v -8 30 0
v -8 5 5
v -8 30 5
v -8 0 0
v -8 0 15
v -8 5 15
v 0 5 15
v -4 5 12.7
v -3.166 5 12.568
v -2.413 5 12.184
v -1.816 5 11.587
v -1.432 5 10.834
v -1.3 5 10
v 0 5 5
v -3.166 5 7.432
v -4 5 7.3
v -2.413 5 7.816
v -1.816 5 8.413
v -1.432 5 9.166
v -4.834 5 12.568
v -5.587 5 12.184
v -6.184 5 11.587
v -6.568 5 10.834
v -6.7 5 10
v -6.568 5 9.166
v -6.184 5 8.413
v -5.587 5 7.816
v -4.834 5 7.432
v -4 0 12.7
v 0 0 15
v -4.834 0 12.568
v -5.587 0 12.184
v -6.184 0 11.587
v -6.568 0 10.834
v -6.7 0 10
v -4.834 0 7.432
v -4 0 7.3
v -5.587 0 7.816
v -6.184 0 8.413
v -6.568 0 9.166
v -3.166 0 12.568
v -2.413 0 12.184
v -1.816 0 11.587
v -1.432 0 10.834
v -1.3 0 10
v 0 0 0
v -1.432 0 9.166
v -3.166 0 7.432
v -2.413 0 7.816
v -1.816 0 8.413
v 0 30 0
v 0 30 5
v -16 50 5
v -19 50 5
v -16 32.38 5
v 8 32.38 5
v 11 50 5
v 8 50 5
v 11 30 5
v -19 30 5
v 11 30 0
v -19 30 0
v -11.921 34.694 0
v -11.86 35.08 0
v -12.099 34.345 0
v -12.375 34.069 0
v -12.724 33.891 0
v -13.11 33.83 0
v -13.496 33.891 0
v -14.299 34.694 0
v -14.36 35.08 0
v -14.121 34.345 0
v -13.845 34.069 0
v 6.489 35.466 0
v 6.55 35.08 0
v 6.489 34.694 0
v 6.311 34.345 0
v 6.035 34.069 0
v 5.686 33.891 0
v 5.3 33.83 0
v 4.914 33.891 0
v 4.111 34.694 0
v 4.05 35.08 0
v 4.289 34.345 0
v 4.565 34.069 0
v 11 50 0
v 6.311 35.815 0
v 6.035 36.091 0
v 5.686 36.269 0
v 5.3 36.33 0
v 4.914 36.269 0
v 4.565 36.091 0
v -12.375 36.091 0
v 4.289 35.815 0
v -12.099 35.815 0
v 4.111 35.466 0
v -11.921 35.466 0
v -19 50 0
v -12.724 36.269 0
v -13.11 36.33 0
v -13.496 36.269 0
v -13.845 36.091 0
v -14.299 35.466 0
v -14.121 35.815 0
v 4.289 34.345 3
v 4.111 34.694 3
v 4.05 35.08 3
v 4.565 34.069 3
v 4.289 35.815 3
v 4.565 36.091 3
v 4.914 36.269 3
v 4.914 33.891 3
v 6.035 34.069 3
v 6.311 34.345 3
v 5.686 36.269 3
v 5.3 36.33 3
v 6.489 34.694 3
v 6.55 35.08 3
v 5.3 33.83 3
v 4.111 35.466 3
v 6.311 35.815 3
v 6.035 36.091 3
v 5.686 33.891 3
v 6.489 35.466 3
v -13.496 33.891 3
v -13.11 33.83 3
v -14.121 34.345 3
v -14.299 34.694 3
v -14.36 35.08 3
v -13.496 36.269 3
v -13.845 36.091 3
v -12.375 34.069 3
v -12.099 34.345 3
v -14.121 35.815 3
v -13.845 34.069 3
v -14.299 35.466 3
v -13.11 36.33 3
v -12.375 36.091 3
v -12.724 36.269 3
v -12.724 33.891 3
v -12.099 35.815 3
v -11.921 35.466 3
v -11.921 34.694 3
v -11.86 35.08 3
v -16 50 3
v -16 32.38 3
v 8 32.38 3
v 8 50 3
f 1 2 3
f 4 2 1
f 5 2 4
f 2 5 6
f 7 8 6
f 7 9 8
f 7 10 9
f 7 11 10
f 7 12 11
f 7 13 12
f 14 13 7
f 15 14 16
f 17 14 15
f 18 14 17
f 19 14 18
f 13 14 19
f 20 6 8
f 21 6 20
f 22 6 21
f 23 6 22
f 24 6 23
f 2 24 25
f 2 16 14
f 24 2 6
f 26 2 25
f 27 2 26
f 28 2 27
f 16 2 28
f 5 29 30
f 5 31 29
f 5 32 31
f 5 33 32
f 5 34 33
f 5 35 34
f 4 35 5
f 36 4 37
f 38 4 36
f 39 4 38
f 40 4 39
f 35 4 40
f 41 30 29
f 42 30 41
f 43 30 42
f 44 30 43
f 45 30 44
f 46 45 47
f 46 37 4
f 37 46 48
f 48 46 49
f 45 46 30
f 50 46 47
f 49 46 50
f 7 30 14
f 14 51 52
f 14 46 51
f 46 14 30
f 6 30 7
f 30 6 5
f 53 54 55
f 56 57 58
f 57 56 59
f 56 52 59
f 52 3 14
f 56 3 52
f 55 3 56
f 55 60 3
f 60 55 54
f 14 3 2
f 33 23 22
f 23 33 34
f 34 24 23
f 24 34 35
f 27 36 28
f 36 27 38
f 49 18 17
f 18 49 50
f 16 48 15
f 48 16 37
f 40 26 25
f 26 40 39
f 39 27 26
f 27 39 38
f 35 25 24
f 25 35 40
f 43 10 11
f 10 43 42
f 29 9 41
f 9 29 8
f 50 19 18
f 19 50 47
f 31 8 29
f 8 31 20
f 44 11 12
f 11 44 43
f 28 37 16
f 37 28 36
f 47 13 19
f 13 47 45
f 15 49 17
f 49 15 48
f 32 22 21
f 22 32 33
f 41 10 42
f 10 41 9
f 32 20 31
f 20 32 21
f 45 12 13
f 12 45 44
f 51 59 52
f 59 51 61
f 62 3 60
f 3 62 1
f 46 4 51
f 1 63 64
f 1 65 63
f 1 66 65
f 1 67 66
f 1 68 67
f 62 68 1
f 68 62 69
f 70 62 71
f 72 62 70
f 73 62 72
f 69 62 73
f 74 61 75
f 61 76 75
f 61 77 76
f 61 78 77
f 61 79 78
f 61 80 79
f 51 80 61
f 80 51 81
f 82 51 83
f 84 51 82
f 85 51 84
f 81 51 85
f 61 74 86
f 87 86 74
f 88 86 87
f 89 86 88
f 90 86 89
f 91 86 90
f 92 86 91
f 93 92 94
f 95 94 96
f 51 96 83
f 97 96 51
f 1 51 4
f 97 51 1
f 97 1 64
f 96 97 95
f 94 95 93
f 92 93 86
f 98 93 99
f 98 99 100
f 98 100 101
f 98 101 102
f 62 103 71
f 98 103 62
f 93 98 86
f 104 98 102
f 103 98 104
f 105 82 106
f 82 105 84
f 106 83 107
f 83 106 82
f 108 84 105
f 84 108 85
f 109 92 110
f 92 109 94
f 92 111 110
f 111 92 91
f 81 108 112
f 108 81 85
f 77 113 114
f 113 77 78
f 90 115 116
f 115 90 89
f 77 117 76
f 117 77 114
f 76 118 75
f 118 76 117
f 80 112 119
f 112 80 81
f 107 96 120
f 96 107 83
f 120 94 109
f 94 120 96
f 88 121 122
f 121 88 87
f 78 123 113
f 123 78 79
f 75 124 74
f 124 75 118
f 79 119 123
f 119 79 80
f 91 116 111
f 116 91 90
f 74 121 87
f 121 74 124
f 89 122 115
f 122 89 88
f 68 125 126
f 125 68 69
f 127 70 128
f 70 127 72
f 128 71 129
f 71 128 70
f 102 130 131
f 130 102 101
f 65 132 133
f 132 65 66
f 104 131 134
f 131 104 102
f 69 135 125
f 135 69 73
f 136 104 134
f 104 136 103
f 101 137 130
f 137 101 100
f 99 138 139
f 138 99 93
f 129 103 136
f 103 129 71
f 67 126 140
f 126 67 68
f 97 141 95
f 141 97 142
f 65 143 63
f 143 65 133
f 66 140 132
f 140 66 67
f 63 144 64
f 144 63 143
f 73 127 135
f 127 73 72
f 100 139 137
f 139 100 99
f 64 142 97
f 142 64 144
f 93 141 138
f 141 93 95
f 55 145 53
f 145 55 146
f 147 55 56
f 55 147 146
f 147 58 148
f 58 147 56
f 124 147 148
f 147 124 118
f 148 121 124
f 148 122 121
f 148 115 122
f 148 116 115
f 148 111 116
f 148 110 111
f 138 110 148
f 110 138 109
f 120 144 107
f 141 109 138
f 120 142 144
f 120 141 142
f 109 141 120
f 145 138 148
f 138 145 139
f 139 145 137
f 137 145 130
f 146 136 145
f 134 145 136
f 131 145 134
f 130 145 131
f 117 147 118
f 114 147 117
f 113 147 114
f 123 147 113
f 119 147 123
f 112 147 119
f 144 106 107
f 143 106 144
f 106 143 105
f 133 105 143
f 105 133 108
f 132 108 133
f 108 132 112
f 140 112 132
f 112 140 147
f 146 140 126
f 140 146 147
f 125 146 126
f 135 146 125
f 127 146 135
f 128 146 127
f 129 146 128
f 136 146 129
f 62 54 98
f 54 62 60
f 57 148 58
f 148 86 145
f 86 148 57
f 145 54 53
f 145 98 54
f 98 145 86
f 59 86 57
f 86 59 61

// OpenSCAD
/* [Global Options] */

//There are two ways to mount this, adjustable and fixed. Adjustable can be used for prototyping how it needs to be, but fixed is the recommended option
type = "fixed"; //[fixed, adjustable]

//The total length of the print, usually the length of the hotend minus a small amount. Default value is good for J-Head MK IV-B with a groovemount on a Ultimate Greg's Wade's extruder ( http://www.thingiverse.com/thing:961630 )
hotend_length = 50;

//The resolution to use when rendering holes
resolution = 20;

//If the output should be rendered how it's supposed to be mounted or how it should be printed
render_type = "printed"; //[printed, mounted]

/* [Attachment] */

//The mounting hole to the extruder block, you shouldn't need to modify this
attachment_mount_hole = 5.4;
//The height of the screw mount to the extruder block
attachment_mount_height = 10;
//The thickness of the attachment point to both the extruder block and the sensor board
attachment_thickness = 5;
//The width of the entire attachment
attachment_width = 8;
//The offset from the edges of the internal slide hole. Unused for fixed
attachment_slide_offset = 10;
//The width of the internal slide hole, unused for fixed
attachment_hole_width = 3.2;

/* [Sensor Mount] */
//The mounting holes for the sensor board. Specification is M2.5 screws. Set to exact value so the screws can grip the plastic
sensor_hole = 2.5;
//The width of the sensor board. Taken from the spec sheet
sensor_width = 24;
//The height of the sensor board. Taken from the spec sheet
sensor_height = 17.62;
//The depth of the sensor board
sensor_depth = 2;
//The width of the entire mount
sensor_mount_width = 30;
//The height of the entire mount
sensor_mount_height = 20;

// The thickness of the sensor board mount. On fixed this is the same as the attachment thickness and thus this variable has no effect
sensor_mount_thickness = 8;

// Using the bottom-left of the sensor board, the x of the left hole. Gotten from the spec sheet
sensor_lefthole = 2.7;
// Using the bottom-left of the sensor board, the x of the right hold. Gotten from the spec sheet
sensor_righthole = 21.11;
//Using the bottom-left of the sensor board, the y of both holes. Gotten using the spec sheet
sensor_hole_y = 14.92;
//The width of the attachment point. Unused in fixed
sensor_mount_attach_width = 10;
//The height of the attachment point. Unused in fixed
sensor_mount_attach_height = 8;

/* [Hidden] */
//I use this section for mainly modifying variables used in customizer to variables I used while designing
preview_tab = "";
render_print = render_type == "printed";

//sensor_hole_locations = [[2.7, 14.92], [21.11, 14.92]];
sensor_hole_locations = [[sensor_lefthole, sensor_hole_y], [sensor_righthole, sensor_hole_y]];
sensor_mount_hole = attachment_hole_width;
sensor_mount_depth = sensor_mount_thickness;

$fn = resolution;

if(type == "adjustable"){
if(render_print){
	//Render it how it should be printed
	translate([5, 0, sensor_mount_depth])
	rotate([-90, 0, 0])
	highlight("Sensor Mount")
	sensor_mount();
	
	translate([-5, 0, 0])
	rotate([90, 0, 180])
	highlight("Attachment")
	attachment();
} else {
	//Render it how it should be mounted
	translate([-sensor_mount_width/2, -sensor_mount_depth, 0])
	highlight("Sensor Mount")
	sensor_mount();

	rotate([0, 180, 0])
	translate([-attachment_width/2, 2, -hotend_length-sensor_mount_attach_height/2-sensor_mount_height+sensor_mount_hole*2])
	highlight("Attachment")
	attachment();
}
} else if(type == "fixed"){
	sensor_mount_depth = attachment_thickness;
	if(render_print){
		v2();
	} else {
		translate([0, 0, hotend_length/2])
		rotate([-90, 0, 0])
		translate([attachment_width/2, -hotend_length/2, -attachment_thickness/2])
		v2();
	}
} else echo("Error, invalid type");

module v2(){
	rotate([90, 0, 180])
	highlight("Attachment")
	union(){
	translate([0, attachment_thickness, 0])
		difference(){
			cube([attachment_width, attachment_mount_height, attachment_thickness]); 
			translate([attachment_width/2, attachment_mount_height/2, attachment_thickness/2])
			cylinder(center=true, d=attachment_mount_hole, h=attachment_thickness*2);
	}
	cube([attachment_width, attachment_thickness, hotend_length-sensor_mount_height]);
}
	translate([(sensor_mount_width-attachment_width)/2, hotend_length, attachment_thickness])
	rotate([90, 180, 0])
	highlight("Sensor Mount")
	difference(){
		cube([sensor_mount_width, attachment_thickness, sensor_mount_height]);
		translate([(sensor_mount_width-sensor_width)/2, 0, 0]){
			translate([0, -sensor_depth, -sensor_height])
			cube([sensor_width, sensor_depth*2, sensor_height*2]);
			rotate([90, 0, 0]){
				translate([sensor_hole_locations[0][0], sensor_hole_locations[0][1], -attachment_thickness/2*3])
				cylinder(d=sensor_hole, h=2*sensor_mount_depth);
				
				translate([sensor_hole_locations[1][0], sensor_hole_locations[1][1], -attachment_thickness/2*3])
				cylinder(d=sensor_hole, h=2*sensor_mount_depth);
			}
		}
	}
}

module attachment(){
	translate([0, attachment_thickness, 0])
	difference(){
		cube([attachment_width, attachment_mount_height, attachment_thickness]); 
		translate([attachment_width/2, attachment_mount_height/2, attachment_thickness/2])
		cylinder(center=true, d=attachment_mount_hole, h=attachment_thickness*2);
	}
	
	difference(){
		cube([attachment_width, attachment_thickness, hotend_length]);
		rotate([90, 0, 0])
		translate([attachment_width/2, hotend_length/2, -attachment_thickness/2])
		hull(){
			length = hotend_length - attachment_slide_offset;
			translate([0, length/-2, 0]){
				translate([0, attachment_thickness, 0])
				cylinder(d=attachment_hole_width, h=attachment_thickness*2, center=true);
				translate([0, length, 0])
				cylinder(d=attachment_hole_width, h=attachment_thickness*2, center=true);
		}
	}
}
	
	
}

module sensor_mount(){
	difference(){
		cube([sensor_mount_width, sensor_mount_depth, sensor_mount_height]);
		translate([(sensor_mount_width-sensor_width)/2, 0, 0]){
			translate([0, -sensor_depth, -sensor_height])
			cube([sensor_width, sensor_depth*2, sensor_height*2]);
			rotate([90, 0, 0]){
				translate([sensor_hole_locations[0][0], sensor_hole_locations[0][1], -sensor_mount_depth/2*3])
				cylinder(d=sensor_hole, h=2*sensor_mount_depth);
				
				translate([sensor_hole_locations[1][0], sensor_hole_locations[1][1], -sensor_mount_depth/2*3])
				cylinder(d=sensor_hole, h=2*sensor_mount_depth);
			}
		}
	}
	
	translate([(sensor_mount_width-sensor_mount_attach_width)/2, 0, sensor_mount_height])
	difference(){
		cube([sensor_mount_attach_width, sensor_mount_depth, sensor_mount_attach_height]);
		rotate([90, 0, 0])
		translate([sensor_mount_attach_width/2, sensor_mount_attach_height/2, -sensor_mount_depth/2])
		cylinder(d=sensor_mount_hole, h=2*sensor_mount_depth, center=true);
	}
}

module highlight(this_tab) {
  if (preview_tab == this_tab) {
    color("red") children(0);
  } else {
    children(0);
  }
}
